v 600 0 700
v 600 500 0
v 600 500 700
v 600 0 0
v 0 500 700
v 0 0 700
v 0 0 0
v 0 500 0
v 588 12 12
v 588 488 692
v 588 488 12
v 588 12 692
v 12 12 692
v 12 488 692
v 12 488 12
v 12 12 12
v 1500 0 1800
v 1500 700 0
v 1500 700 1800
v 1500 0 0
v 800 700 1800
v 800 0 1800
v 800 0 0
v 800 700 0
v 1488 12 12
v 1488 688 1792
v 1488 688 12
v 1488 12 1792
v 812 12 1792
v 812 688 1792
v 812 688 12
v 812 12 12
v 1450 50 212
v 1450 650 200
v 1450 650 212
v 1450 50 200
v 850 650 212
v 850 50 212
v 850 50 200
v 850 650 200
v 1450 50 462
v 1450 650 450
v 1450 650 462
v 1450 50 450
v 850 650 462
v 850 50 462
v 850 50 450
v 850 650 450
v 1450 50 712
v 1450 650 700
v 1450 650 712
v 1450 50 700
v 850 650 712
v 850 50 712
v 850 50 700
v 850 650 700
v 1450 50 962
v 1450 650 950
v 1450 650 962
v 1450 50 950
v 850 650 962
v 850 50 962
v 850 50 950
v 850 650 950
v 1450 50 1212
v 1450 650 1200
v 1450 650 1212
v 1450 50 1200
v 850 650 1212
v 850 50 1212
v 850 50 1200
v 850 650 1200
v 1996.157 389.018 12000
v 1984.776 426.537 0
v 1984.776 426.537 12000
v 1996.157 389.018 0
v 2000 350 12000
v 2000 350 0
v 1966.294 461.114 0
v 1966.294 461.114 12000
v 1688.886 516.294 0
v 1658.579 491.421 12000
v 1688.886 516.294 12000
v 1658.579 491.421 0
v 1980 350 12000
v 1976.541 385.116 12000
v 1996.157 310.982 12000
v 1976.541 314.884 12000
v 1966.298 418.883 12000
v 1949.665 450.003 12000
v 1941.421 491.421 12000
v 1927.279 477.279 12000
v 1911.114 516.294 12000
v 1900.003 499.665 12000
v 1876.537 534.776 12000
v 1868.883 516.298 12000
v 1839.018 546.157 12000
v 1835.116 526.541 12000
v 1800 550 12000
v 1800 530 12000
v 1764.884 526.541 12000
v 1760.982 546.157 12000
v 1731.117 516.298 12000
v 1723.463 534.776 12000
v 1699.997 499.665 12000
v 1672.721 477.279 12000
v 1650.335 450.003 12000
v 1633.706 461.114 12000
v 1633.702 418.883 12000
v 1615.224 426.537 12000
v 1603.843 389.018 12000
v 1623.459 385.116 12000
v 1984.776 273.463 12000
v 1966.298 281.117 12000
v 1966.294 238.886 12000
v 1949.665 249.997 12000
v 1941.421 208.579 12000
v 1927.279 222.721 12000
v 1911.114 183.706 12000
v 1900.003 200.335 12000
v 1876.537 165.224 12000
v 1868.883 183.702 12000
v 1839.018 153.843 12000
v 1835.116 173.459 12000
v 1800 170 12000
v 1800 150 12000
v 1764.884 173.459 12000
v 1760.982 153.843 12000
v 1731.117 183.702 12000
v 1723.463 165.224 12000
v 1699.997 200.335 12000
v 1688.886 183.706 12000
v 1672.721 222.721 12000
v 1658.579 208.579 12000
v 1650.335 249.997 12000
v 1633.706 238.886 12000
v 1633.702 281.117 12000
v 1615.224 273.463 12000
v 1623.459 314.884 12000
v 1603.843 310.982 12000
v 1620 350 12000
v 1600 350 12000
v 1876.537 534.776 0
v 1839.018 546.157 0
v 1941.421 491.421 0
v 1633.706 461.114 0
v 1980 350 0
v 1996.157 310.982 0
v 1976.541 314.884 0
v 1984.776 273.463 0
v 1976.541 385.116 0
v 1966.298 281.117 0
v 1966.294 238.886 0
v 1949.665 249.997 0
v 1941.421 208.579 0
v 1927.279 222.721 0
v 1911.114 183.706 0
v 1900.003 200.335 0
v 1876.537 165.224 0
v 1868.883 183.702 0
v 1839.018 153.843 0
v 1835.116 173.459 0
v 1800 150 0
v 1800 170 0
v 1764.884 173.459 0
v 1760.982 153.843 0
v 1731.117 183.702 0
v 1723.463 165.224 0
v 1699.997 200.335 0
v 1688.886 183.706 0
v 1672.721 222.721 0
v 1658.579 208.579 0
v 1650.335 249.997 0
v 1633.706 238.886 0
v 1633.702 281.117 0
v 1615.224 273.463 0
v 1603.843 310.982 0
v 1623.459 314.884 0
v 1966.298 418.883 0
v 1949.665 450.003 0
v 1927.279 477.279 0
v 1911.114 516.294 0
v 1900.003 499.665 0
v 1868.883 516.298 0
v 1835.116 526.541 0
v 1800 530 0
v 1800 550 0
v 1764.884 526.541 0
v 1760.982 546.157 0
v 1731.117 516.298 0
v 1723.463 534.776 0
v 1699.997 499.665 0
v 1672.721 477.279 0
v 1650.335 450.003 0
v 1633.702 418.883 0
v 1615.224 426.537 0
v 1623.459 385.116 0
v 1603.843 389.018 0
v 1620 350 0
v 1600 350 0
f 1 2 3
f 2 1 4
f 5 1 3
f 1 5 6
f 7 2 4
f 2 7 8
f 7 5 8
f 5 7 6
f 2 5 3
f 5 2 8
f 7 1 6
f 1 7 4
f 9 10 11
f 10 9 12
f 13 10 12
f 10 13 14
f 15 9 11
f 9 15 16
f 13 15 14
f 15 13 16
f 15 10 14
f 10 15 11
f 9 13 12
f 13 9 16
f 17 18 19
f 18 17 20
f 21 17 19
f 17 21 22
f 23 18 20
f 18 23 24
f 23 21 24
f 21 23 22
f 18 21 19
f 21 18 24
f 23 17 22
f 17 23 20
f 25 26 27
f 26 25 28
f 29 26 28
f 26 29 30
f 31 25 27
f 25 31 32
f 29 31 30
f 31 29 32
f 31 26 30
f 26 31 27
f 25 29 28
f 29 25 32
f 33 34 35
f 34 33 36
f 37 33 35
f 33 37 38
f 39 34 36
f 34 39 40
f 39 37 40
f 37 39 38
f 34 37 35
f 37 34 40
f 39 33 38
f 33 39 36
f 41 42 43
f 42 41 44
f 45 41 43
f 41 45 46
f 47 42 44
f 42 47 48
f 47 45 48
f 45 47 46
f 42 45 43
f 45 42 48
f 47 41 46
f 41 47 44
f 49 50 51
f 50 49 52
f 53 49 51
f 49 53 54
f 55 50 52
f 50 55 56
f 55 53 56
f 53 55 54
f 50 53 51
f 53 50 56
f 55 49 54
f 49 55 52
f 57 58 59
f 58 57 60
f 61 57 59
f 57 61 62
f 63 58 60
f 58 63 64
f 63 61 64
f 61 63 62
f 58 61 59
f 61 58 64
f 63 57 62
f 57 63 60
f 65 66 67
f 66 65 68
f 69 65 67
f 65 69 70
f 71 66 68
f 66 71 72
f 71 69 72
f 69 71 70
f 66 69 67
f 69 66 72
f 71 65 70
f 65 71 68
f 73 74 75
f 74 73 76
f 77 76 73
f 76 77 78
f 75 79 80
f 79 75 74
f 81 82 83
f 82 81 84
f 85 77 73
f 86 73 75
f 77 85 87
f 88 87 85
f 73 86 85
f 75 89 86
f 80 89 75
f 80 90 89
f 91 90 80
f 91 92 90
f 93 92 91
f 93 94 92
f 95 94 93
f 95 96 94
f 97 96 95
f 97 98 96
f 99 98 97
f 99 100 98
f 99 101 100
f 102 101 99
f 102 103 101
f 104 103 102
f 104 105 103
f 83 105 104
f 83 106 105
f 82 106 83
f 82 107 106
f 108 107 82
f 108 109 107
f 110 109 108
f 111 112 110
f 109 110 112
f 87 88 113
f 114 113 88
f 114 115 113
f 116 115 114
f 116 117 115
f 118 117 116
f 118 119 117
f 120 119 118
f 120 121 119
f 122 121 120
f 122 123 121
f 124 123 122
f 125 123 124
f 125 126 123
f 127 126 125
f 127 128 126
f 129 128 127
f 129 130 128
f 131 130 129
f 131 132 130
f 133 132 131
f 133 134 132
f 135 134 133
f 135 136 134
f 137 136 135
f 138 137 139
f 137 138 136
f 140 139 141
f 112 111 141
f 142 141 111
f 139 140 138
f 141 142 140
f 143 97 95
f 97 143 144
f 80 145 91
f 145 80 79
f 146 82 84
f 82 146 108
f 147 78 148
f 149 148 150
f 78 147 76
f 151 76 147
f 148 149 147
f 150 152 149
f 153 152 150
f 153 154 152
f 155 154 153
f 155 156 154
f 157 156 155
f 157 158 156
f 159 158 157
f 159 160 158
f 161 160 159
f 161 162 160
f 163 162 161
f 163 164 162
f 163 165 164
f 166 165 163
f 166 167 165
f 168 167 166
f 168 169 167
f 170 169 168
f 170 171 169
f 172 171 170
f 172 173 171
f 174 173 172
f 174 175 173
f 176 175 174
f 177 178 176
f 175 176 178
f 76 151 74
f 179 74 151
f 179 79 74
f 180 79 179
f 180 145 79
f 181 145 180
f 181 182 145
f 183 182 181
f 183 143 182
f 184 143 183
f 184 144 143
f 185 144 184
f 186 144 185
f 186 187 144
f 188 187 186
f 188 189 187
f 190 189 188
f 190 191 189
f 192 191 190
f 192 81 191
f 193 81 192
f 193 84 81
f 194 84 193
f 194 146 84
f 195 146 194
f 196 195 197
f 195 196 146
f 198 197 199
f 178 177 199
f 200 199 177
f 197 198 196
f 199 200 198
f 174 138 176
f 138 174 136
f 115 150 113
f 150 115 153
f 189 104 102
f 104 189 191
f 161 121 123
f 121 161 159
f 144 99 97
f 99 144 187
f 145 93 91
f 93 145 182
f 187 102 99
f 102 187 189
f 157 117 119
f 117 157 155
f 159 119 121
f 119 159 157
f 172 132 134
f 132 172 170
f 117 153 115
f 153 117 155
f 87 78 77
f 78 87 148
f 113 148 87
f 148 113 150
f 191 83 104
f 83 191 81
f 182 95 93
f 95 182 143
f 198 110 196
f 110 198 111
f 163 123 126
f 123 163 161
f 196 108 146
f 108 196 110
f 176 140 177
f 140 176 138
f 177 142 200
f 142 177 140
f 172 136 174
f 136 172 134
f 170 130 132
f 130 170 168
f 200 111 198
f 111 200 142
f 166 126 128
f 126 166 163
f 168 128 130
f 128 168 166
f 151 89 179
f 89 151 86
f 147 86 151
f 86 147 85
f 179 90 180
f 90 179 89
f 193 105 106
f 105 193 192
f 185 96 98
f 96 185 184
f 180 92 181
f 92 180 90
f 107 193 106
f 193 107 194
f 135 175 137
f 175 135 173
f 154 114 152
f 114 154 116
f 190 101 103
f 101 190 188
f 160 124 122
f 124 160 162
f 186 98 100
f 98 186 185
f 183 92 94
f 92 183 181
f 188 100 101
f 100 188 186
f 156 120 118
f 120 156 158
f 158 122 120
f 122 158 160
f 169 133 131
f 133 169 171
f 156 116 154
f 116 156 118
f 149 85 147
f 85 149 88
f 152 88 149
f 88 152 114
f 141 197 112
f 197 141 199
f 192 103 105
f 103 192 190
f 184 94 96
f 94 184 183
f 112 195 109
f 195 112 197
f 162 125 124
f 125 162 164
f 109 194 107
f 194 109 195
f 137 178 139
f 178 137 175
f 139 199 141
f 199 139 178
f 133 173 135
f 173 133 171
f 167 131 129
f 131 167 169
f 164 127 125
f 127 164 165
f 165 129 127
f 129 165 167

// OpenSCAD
// file: ../params.scad
// Shared millimetre parameters. Keep in lockstep with freecad/params.py.
// Module scale: 150 kg/day wet train. Walls are CPVC sheet, not metal.

$fn = 36;

WALL        = 12;     // CPVC sheet thickness
FLOOR       = 16;     // floor plate (trough sits on this)

// LEACH CSTR 1 — inside liquor box
CSTR_L      = 2000;
CSTR_W      = 1200;
CSTR_H      = 1400;   // liquid + freeboard
FREEBOARD   = 200;

// CSTR 2 weir (same vessel, +X wall)
WEIR_W      = 450;
WEIR_CREST  = CSTR_H - FREEBOARD;   // from inner floor
WEIR_SLOT_H = 80;
WEIR_LIP    = 120;    // external spout projection

// CSTR 3 floor auger — injection-molded PVC / FG
AUGER_D     = 140;    // flight OD
AUGER_SHAFT = 40;
AUGER_PITCH = 110;
AUGER_TROUGH_W = 180;
AUGER_TROUGH_H = 110;
AUGER_OFFSET_Y = 280; // trough centreline from inner -Y wall
AUGER_INCLINE  = 28;  // deg, lifts out of liquor toward +X

// mixer / nozzles (lid)
MIXER_D     = 50;
GAS_D       = 80;     // acid-gas takeoff
DROP_X      = 80;     // inner-X of shred drop slot
DROP_L      = 400;
DROP_W      = 250;
DROP_COAM   = 80;     // raised coaming around the slot

// LEACHATE PUMP / coarse strainer — −X wall, opposite the weir
PUMP_D      = 80;     // DN80
PUMP_Z      = 450;    // centreline above inner floor (submerged)
PUMP_Y      = 900;    // centreline from inner −Y (away from auger)
STRAINER_L  = 180;
STRAINER_W  = 140;
STRAINER_H  = 160;

// mezzanine feed train
MEZZ_H      = 2200;   // platform top above tank outer floor
MEZZ_L      = 1600;   // platform length in −X
MEZZ_THK    = 12;
HOPPER_L    = 700;
HOPPER_W    = 600;
HOPPER_H    = 800;
SHRED_L     = 500;
SHRED_W     = 500;
SHRED_H     = 450;
CONV_W      = 240;
CONV_H      = 120;
CONV_PLATE  = 6;      // trough plate
CONV_FLANGE = 40;
CONV_SPRING_D = 50;
CONV_SPRING_H = 80;
CONV_BOLT   = 10;     // M10 clearance
CONV_LEN    = 1800;   // default standalone length; plant instance is computed
DUST_D      = 150;    // dust-hood outlet to DUST header
AUGER_LIFT_L = 700;

// dewater belts + split (Phase A 4–6)
FDEW_L      = 1800;
FDEW_W      = 450;
FDEW_H      = 80;
FDEW_RISE   = 120;    // solids end higher so liquor runs back to weir
SDEW_L      = 1400;
SDEW_W      = 220;
SDEW_H      = 80;
SPLIT_L     = 600;
SPLIT_W     = 500;
SPLIT_H     = 400;
STUB_L      = 400;
STUB_W      = 300;
STUB_H      = 250;

// EW funnel cell
EW_L        = 600;    // along aisle (overflow direction)
EW_W        = 420;    // anode-cathode depth
EW_H        = 650;    // rectangular body
EW_FUNNEL_H = 220;
EW_VALVE_D  = 50;
EW_VALVE_L  = 60;
EW_MEM_T    = 4;      // CEM
EW_SLOT     = 10;     // membrane cassette slot
EW_PITCH    = 750;    // aisle spacing, centre to centre
AISLE_X0    = 200;
AISLE_Y     = -(EW_W + 2*WALL) - 400;
AISLE_Z     = 400;
BUND_H      = 150;
BUND_PAD    = 250;
SUMP_L      = 400;
SUMP_W      = 400;
SUMP_H      = 300;
VDF_D       = 700;
VDF_L       = 900;
PAIL_W      = 180;
HDR_D       = 80;
HDR_Z       = 1400;
PYRO_D      = 320;
PYRO_L      = 2800;

// Campus envelopes — lockstep with freecad/params.py
FARM_X=12000; FARM_Y=8000; FARM_L=12000; FARM_W=8000; FARM_H=4500;
FAB_X=12000;  FAB_Y=-6000; FAB_L=8000;   FAB_W=6000;  FAB_H=4000;
HAB_X=-8000;  HAB_Y=8000;  HAB_L=8000;   HAB_W=6000;  HAB_H=3200;
CRYO_X=-6000; CRYO_Y=-4000; CRYO_L=4000; CRYO_W=3000; CRYO_H=3000;
MFG_X=2000;   MFG_Y=9000;  MFG_L=6000;   MFG_W=4000;  MFG_H=3500;

LIFE_Z_GREY=900; LIFE_Z_UPW=1100; LIFE_Z_ETCH=1300;
LIFE_Z_O2=2800; LIFE_Z_N2=3000; LIFE_Z_CO2=3200;
LIFE_D_GREY=50; LIFE_D_UPW=40; LIFE_D_ETCH=32;
LIFE_D_GAS=25; LIFE_D_CO2=40;
// main file
// 8.1 DEMISTER + ALK SCRUBBER + FAN STACK. Pregnant liquor → CRU.
include <../params.scad>;
$fn = 32;

module mfg_demister() {
    difference() {
        cube([600, 500, 700]);
        translate([12, 12, 12]) cube([576, 476, 680]);
    }
}

module mfg_alk_scrubber() {
    difference() {
        cube([700, 700, 1800]);
        translate([12, 12, 12]) cube([676, 676, 1780]);
    }
    for (z = [200:250:1400])
        translate([50, 50, z]) cube([600, 600, 12]);
}

module mfg_fan_stack() {
    difference() {
        cylinder(h=12000, d=400);
        translate([0, 0, -1]) cylinder(h=12002, d=360);
    }
}

mfg_demister();
translate([800, 0, 0]) mfg_alk_scrubber();
translate([1800, 350, 0]) mfg_fan_stack();
